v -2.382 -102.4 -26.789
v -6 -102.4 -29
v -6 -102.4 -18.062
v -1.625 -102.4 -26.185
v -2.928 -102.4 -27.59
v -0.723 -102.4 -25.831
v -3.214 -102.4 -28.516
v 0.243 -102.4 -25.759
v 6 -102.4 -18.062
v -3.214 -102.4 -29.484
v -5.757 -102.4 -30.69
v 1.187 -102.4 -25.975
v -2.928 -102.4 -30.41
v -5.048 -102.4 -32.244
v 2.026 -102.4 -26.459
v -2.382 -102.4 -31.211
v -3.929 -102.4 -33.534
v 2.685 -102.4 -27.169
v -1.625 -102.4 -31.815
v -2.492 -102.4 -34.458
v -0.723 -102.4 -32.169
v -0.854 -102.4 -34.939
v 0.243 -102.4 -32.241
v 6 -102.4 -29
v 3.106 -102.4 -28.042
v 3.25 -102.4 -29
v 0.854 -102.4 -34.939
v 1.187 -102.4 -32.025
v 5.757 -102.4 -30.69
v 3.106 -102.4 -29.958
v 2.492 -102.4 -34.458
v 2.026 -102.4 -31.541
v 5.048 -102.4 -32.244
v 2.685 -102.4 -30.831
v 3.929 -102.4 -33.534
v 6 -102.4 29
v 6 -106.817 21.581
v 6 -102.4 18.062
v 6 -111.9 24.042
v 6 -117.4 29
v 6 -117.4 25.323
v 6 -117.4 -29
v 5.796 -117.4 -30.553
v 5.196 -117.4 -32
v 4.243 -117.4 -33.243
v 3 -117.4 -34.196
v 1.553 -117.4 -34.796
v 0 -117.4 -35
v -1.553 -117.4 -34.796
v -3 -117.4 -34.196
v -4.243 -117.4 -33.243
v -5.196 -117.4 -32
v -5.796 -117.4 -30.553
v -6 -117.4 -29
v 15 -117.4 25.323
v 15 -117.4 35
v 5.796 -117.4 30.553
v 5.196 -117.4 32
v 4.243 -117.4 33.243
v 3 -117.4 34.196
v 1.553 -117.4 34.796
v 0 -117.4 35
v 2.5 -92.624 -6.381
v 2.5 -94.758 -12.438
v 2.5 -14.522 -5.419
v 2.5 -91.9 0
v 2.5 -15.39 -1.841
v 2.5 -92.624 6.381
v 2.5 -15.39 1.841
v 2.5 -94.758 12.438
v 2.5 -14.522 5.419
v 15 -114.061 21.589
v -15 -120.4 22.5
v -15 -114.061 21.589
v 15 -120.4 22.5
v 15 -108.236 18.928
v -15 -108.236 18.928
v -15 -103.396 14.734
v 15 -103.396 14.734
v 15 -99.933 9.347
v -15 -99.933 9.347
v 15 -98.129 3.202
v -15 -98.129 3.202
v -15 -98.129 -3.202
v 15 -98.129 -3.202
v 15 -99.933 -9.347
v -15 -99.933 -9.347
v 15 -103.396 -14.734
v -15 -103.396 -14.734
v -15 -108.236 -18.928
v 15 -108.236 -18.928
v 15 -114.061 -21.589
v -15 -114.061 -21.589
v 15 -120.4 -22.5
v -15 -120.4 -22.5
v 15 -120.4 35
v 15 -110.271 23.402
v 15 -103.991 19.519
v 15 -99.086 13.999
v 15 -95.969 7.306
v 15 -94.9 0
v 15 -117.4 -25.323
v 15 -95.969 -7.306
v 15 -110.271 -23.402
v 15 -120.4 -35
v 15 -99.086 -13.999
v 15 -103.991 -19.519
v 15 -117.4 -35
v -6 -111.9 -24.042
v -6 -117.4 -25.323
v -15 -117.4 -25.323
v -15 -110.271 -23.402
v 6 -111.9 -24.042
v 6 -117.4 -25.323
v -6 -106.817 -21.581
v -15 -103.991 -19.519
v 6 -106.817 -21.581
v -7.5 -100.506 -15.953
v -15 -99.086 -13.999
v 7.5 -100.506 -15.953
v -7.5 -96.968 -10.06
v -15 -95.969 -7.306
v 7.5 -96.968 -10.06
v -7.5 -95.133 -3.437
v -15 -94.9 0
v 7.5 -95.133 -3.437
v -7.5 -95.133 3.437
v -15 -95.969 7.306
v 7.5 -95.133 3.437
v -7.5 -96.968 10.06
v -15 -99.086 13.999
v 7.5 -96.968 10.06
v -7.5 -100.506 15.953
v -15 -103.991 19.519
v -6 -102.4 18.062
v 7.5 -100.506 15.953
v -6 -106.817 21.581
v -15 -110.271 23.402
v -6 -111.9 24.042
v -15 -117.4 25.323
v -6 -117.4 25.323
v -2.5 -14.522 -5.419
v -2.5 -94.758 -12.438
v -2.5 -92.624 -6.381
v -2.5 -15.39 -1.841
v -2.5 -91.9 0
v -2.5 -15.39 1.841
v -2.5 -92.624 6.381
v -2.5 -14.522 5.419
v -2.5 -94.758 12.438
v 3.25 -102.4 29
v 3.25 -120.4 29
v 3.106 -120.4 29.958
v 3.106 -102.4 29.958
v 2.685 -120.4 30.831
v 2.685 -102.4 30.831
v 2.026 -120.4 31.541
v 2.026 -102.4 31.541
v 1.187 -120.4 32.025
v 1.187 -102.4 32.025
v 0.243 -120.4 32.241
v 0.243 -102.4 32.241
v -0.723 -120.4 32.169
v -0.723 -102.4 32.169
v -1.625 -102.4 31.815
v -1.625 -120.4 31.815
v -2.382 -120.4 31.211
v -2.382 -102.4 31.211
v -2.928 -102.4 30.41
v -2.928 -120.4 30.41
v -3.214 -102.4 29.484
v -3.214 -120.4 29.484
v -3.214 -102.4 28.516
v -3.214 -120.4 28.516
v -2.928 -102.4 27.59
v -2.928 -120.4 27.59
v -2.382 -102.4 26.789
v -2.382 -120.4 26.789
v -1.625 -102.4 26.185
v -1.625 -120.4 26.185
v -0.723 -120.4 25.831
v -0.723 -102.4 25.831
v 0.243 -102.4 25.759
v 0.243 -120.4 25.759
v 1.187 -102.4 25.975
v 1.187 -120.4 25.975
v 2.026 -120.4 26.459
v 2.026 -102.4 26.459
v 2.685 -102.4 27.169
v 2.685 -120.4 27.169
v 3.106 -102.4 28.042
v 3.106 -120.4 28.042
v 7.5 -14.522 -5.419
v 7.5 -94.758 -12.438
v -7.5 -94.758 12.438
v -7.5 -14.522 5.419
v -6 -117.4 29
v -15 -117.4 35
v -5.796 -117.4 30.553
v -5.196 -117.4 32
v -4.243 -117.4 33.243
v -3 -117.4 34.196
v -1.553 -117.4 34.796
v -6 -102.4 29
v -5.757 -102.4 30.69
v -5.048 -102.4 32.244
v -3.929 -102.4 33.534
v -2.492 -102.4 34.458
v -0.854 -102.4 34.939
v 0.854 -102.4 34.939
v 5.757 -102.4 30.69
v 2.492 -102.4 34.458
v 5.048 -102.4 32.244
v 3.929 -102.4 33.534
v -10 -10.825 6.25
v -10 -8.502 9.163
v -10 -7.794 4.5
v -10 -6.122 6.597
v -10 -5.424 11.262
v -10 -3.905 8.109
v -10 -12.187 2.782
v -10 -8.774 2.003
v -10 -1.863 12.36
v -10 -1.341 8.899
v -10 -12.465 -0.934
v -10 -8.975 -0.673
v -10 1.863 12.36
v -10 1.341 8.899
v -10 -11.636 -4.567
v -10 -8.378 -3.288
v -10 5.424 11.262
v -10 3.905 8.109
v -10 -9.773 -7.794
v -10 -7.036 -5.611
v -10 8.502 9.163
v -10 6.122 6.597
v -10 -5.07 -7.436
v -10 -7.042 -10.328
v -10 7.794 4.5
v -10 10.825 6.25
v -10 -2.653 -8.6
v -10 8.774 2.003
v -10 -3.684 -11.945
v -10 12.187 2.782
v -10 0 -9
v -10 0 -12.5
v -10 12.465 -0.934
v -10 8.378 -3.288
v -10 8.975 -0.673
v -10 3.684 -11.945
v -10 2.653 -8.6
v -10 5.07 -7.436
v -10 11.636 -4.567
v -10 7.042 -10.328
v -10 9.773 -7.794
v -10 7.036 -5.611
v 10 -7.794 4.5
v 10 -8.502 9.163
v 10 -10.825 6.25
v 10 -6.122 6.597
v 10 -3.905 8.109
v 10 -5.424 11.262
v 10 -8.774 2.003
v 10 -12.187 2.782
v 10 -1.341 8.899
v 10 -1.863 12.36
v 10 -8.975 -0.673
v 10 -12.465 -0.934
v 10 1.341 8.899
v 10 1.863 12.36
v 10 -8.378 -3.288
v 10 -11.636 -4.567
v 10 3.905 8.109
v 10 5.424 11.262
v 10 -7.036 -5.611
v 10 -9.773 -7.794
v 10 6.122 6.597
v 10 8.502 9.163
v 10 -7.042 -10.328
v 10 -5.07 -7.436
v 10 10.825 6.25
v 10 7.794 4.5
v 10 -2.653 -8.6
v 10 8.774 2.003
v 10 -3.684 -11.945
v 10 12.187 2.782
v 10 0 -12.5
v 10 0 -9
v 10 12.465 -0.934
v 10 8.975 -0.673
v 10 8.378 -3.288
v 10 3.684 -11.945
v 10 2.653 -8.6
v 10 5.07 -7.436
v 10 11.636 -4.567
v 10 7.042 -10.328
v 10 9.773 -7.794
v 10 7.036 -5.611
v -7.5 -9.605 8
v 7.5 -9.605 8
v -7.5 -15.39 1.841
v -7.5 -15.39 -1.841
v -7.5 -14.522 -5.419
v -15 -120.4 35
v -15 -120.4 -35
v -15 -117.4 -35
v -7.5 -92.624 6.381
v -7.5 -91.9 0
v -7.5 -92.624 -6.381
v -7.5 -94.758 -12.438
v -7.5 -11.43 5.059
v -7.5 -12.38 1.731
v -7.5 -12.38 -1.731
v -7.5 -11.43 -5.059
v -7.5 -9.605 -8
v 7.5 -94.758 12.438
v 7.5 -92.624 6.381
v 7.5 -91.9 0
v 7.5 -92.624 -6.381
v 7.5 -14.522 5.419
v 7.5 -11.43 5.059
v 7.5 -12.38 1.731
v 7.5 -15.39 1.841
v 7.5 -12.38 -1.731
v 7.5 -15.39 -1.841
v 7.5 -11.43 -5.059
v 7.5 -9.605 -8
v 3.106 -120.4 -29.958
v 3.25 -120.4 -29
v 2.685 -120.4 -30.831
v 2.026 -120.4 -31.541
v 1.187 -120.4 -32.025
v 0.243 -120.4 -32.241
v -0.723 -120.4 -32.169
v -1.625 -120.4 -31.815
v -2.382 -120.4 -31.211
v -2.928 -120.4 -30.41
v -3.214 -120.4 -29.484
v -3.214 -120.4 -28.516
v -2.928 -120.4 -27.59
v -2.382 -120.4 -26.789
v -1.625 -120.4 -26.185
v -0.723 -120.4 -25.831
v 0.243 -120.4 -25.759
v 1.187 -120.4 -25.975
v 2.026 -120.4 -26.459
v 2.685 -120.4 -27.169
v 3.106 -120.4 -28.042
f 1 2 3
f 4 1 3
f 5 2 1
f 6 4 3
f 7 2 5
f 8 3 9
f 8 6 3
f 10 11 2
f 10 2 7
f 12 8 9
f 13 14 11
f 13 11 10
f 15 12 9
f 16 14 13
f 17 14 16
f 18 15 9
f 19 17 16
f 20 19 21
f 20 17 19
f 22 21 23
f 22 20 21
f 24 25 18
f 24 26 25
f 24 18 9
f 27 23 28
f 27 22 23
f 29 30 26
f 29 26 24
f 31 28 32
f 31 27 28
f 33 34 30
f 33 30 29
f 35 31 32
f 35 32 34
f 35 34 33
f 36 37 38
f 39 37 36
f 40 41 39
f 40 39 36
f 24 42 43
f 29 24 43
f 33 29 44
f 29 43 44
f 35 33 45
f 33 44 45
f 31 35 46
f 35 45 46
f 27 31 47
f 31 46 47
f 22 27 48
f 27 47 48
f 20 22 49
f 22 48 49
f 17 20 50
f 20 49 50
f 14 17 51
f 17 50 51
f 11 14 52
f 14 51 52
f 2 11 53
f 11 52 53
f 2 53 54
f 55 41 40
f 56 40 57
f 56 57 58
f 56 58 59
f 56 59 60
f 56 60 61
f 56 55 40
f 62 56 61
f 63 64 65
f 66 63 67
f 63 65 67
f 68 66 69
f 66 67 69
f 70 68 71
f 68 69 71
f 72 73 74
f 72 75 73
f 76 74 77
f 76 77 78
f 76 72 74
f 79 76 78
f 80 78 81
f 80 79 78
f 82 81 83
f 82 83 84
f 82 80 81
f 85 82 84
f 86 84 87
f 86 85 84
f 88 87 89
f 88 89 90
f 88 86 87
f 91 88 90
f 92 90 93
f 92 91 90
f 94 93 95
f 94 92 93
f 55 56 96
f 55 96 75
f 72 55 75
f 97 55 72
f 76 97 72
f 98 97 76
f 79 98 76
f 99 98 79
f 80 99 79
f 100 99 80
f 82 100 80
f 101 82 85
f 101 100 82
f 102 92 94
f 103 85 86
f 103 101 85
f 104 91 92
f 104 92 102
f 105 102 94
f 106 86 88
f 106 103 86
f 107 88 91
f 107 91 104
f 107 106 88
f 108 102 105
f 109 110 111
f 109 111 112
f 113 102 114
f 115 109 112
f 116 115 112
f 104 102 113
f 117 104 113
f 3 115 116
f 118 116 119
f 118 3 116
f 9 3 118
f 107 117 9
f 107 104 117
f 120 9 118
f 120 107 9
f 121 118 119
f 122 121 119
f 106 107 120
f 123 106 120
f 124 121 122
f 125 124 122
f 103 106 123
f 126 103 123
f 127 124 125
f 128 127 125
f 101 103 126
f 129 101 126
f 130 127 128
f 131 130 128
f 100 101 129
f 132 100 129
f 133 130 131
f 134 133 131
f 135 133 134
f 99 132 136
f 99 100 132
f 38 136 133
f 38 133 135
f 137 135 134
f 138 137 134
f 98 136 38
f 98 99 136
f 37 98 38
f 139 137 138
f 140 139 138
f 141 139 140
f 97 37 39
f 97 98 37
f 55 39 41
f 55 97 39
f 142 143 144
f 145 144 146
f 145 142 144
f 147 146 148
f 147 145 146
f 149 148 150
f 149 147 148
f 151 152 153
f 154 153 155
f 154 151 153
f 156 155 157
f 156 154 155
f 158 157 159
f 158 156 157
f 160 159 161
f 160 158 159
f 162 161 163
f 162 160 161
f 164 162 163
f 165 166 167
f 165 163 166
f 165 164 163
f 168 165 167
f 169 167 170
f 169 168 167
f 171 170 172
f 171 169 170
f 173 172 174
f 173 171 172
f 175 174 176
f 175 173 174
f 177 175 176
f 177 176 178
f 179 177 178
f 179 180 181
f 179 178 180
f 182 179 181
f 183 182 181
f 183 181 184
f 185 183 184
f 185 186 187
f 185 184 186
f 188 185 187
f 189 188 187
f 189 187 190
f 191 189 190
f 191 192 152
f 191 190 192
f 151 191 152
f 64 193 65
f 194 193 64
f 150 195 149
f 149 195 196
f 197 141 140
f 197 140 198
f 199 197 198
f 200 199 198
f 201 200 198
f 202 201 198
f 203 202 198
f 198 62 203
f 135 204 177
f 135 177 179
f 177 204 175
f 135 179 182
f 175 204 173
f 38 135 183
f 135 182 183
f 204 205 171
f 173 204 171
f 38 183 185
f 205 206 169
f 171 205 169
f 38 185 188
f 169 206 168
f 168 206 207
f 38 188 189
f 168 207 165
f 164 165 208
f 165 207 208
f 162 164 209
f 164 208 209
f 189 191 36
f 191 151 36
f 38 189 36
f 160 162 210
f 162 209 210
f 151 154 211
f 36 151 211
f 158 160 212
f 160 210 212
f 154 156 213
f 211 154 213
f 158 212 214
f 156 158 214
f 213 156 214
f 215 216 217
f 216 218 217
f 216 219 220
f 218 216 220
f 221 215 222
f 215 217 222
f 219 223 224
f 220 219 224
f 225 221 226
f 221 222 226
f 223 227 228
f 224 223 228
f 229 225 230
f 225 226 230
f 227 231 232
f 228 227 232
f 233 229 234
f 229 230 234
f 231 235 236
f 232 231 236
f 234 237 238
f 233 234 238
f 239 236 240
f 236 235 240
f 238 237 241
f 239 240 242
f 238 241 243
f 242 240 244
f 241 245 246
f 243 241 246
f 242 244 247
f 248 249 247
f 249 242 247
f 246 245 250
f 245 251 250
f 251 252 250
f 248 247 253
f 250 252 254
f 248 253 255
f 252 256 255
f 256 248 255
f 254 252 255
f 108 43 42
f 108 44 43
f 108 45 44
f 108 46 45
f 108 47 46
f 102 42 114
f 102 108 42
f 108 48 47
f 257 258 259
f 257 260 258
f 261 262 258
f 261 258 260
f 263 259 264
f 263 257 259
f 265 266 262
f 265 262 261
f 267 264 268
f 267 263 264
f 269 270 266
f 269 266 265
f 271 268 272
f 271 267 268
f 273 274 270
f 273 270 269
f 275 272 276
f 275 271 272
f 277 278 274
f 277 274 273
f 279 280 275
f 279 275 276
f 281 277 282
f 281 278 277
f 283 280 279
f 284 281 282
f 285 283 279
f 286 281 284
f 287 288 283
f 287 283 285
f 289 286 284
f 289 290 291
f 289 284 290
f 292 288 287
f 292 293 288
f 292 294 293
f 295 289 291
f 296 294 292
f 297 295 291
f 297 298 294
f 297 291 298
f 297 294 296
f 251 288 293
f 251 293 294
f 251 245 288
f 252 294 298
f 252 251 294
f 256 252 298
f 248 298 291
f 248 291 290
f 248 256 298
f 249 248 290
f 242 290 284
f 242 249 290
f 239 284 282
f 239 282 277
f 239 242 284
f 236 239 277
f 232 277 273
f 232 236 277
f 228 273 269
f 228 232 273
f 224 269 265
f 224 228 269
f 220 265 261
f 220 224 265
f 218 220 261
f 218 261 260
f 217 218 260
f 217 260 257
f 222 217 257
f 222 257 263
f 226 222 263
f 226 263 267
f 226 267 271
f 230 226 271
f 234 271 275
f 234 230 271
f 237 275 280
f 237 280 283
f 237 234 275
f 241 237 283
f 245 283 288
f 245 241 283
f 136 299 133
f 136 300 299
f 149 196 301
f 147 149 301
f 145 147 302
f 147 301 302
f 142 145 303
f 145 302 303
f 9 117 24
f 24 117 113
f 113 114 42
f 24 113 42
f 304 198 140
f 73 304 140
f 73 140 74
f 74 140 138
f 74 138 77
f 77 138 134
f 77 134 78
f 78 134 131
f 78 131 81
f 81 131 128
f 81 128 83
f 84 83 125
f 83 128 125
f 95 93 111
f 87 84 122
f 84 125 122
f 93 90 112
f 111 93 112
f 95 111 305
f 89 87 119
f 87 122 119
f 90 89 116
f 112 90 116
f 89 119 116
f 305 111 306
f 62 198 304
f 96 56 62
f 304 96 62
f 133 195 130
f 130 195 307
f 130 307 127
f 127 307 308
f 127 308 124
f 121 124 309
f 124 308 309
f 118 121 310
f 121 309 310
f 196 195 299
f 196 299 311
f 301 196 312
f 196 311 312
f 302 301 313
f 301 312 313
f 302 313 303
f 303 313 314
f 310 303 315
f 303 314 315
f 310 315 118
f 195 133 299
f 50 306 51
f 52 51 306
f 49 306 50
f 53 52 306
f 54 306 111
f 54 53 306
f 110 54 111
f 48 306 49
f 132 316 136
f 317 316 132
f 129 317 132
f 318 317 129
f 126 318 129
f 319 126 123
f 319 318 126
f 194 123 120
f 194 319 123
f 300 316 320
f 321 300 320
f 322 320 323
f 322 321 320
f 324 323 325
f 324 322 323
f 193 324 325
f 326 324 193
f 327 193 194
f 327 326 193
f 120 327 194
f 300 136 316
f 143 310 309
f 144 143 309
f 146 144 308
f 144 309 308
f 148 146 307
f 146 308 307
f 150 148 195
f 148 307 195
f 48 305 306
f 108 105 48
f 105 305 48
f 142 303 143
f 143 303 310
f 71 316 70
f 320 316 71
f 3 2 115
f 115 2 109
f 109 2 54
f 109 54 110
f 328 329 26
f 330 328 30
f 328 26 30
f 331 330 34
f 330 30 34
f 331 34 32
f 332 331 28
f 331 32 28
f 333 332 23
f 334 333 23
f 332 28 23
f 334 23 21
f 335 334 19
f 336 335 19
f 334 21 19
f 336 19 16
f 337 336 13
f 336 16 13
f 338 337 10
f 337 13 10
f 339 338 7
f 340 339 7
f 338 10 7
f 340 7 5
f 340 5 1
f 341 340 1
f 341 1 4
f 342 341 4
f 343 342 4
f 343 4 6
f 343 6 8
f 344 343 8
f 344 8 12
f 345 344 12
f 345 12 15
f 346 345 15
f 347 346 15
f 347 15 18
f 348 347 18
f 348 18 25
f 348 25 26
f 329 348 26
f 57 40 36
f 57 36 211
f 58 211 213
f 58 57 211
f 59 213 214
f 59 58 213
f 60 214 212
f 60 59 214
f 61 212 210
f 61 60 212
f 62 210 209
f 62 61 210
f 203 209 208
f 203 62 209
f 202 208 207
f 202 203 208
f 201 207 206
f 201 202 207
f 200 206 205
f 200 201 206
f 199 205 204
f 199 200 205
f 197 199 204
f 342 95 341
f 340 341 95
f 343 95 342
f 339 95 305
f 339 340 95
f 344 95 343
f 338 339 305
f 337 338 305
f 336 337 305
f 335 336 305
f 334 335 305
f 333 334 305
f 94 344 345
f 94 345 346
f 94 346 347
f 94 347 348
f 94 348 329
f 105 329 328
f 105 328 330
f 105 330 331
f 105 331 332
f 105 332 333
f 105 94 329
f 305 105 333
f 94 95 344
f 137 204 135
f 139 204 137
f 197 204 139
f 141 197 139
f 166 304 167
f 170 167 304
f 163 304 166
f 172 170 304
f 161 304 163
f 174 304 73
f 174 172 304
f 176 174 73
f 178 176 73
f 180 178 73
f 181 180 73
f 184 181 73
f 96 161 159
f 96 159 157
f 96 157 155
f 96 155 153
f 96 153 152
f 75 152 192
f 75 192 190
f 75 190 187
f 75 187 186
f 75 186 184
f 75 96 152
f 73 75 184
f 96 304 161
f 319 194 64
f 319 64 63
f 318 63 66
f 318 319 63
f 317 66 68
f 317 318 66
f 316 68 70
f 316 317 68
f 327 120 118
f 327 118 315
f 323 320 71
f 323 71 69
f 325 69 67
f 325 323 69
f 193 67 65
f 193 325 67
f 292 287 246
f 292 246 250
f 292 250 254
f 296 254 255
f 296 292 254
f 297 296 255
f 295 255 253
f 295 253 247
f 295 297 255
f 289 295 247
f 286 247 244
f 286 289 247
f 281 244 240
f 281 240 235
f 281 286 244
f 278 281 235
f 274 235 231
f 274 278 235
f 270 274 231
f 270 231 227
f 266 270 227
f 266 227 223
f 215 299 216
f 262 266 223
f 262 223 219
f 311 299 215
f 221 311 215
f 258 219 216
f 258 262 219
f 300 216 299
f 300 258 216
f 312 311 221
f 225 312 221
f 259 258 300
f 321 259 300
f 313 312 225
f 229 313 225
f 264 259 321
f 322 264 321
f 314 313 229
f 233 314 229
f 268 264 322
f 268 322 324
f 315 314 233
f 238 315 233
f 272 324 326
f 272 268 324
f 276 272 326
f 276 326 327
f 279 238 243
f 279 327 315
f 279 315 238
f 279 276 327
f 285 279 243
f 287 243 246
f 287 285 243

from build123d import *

# Parameters (mm, degrees)
SKETCH1_R           = 9
BOSS_EXTRUDE1_DEPTH = 10
BOSS_EXTRUDE2_DEPTH = 15
BOSS_EXTRUDE3_DEPTH = 7.5
BOSS_EXTRUDE4_DEPTH = 15
SKETCH3_R           = 3.25
CUT_EXTRUDE1_DEPTH  = 122.045487318
SKETCH4_R           = 22.5
CUT_EXTRUDE2_DEPTH  = 151
CUT_EXTRUDE3_DEPTH  = 5


with BuildPart() as part:
    # Sketch1 → Boss-Extrude1 (new, symmetric)
    with BuildSketch(Plane(origin=(0, 0, 0), x_dir=(0, 0, -1), z_dir=(1, 0, 0))):
        with BuildLine():
            ThreePointArc((-8, -9.604686356), (0, -12.5), (8, -9.604686356))
            ThreePointArc((8, -9.604686356), (11.319231423, -5.303300859), (12.5, 0))
            ThreePointArc((12.5, 0), (-5.303300859, 11.319231423), (-8, -9.604686356))
        make_face()
        Circle(SKETCH1_R, mode=Mode.SUBTRACT)
    extrude(amount=BOSS_EXTRUDE1_DEPTH, both=True)



with BuildPart() as body_2:
    # Sketch1<3> → Boss-Extrude2 (new, symmetric)
    with BuildSketch(Plane(origin=(0, 0, 0), x_dir=(0, 0, -1), z_dir=(1, 0, 0))):
        with BuildLine():
            Line((22.5, -120.4), (35, -120.4))
            Line((35, -120.4), (35, -117.4))
            Line((35, -117.4), (25.322914524, -117.4))
            ThreePointArc((25.322914524, -117.4), (0, -94.9), (-25.322914524, -117.4))
            Line((-25.322914524, -117.4), (-35, -117.4))
            Line((-35, -117.4), (-35, -120.4))
            Line((-35, -120.4), (-22.5, -120.4))
            ThreePointArc((-22.5, -120.4), (0, -97.9), (22.5, -120.4))
        make_face()
    extrude(amount=BOSS_EXTRUDE2_DEPTH, both=True)


with BuildPart() as part_1:
    add(part.part)

    add(body_2.part)  # Boss-Extrude3 merges body 2
    # Sketch1<7> → Boss-Extrude3 (add, symmetric)
    with BuildSketch(Plane(origin=(0, 0, 0), x_dir=(0, 0, -1), z_dir=(1, 0, 0))):
        with BuildLine():
            ThreePointArc((-15.952867936, -100.506382817), (0, -94.9), (15.952867936, -100.506382817))
            Line((15.952867936, -100.506382817), (8, -9.604686356))
            ThreePointArc((8, -9.604686356), (0, -12.5), (-8, -9.604686356))
            Line((-8, -9.604686356), (-15.952867936, -100.506382817))
        make_face()
    extrude(amount=BOSS_EXTRUDE3_DEPTH, both=True)

    # Sketch2 → Boss-Extrude4 (add)
    with BuildSketch(Plane(origin=(0, -117.4, 0), x_dir=(1, 0, 0), z_dir=(0, 1, 0))):
        with BuildLine():
            Line((-6, 29), (-6, 17))
            Line((-6, 17), (6, 17))
            Line((6, 17), (6, 29))
            ThreePointArc((6, 29), (0, 35), (-6, 29))
        make_face()
    boss_extrude4 = extrude(amount=BOSS_EXTRUDE4_DEPTH)

    # Sketch3 → Cut-Extrude1 (cut, through all)
    with BuildSketch(Plane(origin=(0, -102.4, 0), x_dir=(1, 0, 0), z_dir=(0, 1, 0))):
        with Locations((0, 29)):
            Circle(SKETCH3_R)
    cut_extrude1 = extrude(amount=-CUT_EXTRUDE1_DEPTH, mode=Mode.SUBTRACT)

    # Mirror1: Boss-Extrude4, Cut-Extrude1 across plane
    add(boss_extrude4.mirror(Plane.XY))
    add(cut_extrude1.mirror(Plane.XY), mode=Mode.SUBTRACT)

    # Sketch4 → Cut-Extrude2 (cut)
    with BuildSketch(Plane(origin=(15, 0, 0), x_dir=(0, 0, -1), z_dir=(1, 0, 0))):
        with Locations((0, -120.4)):
            Circle(SKETCH4_R)
    extrude(amount=-CUT_EXTRUDE2_DEPTH, mode=Mode.SUBTRACT)

    # Sketch5 → Cut-Extrude3 (cut)
    with BuildSketch(Plane(origin=(7.5, 0, 0), x_dir=(0, 0, -1), z_dir=(1, 0, 0))):
        with BuildLine():
            Line((12.438451255, -94.757556076), (5.4187458, -14.521955583))
            ThreePointArc((5.4187458, -14.521955583), (0, -15.5), (-5.4187458, -14.521955583))
            Line((-5.4187458, -14.521955583), (-12.438451255, -94.757556076))
            ThreePointArc((-12.438451255, -94.757556076), (0, -91.9), (12.438451255, -94.757556076))
        make_face()
    cut_extrude3 = extrude(amount=-CUT_EXTRUDE3_DEPTH, mode=Mode.SUBTRACT)

    # Mirror2: Cut-Extrude3 across plane
    add(cut_extrude3.mirror(Plane(origin=(0, 0, 0), x_dir=(0, 0, 1), z_dir=(1, 0, 0))), mode=Mode.SUBTRACT)


solid = part_1.part
